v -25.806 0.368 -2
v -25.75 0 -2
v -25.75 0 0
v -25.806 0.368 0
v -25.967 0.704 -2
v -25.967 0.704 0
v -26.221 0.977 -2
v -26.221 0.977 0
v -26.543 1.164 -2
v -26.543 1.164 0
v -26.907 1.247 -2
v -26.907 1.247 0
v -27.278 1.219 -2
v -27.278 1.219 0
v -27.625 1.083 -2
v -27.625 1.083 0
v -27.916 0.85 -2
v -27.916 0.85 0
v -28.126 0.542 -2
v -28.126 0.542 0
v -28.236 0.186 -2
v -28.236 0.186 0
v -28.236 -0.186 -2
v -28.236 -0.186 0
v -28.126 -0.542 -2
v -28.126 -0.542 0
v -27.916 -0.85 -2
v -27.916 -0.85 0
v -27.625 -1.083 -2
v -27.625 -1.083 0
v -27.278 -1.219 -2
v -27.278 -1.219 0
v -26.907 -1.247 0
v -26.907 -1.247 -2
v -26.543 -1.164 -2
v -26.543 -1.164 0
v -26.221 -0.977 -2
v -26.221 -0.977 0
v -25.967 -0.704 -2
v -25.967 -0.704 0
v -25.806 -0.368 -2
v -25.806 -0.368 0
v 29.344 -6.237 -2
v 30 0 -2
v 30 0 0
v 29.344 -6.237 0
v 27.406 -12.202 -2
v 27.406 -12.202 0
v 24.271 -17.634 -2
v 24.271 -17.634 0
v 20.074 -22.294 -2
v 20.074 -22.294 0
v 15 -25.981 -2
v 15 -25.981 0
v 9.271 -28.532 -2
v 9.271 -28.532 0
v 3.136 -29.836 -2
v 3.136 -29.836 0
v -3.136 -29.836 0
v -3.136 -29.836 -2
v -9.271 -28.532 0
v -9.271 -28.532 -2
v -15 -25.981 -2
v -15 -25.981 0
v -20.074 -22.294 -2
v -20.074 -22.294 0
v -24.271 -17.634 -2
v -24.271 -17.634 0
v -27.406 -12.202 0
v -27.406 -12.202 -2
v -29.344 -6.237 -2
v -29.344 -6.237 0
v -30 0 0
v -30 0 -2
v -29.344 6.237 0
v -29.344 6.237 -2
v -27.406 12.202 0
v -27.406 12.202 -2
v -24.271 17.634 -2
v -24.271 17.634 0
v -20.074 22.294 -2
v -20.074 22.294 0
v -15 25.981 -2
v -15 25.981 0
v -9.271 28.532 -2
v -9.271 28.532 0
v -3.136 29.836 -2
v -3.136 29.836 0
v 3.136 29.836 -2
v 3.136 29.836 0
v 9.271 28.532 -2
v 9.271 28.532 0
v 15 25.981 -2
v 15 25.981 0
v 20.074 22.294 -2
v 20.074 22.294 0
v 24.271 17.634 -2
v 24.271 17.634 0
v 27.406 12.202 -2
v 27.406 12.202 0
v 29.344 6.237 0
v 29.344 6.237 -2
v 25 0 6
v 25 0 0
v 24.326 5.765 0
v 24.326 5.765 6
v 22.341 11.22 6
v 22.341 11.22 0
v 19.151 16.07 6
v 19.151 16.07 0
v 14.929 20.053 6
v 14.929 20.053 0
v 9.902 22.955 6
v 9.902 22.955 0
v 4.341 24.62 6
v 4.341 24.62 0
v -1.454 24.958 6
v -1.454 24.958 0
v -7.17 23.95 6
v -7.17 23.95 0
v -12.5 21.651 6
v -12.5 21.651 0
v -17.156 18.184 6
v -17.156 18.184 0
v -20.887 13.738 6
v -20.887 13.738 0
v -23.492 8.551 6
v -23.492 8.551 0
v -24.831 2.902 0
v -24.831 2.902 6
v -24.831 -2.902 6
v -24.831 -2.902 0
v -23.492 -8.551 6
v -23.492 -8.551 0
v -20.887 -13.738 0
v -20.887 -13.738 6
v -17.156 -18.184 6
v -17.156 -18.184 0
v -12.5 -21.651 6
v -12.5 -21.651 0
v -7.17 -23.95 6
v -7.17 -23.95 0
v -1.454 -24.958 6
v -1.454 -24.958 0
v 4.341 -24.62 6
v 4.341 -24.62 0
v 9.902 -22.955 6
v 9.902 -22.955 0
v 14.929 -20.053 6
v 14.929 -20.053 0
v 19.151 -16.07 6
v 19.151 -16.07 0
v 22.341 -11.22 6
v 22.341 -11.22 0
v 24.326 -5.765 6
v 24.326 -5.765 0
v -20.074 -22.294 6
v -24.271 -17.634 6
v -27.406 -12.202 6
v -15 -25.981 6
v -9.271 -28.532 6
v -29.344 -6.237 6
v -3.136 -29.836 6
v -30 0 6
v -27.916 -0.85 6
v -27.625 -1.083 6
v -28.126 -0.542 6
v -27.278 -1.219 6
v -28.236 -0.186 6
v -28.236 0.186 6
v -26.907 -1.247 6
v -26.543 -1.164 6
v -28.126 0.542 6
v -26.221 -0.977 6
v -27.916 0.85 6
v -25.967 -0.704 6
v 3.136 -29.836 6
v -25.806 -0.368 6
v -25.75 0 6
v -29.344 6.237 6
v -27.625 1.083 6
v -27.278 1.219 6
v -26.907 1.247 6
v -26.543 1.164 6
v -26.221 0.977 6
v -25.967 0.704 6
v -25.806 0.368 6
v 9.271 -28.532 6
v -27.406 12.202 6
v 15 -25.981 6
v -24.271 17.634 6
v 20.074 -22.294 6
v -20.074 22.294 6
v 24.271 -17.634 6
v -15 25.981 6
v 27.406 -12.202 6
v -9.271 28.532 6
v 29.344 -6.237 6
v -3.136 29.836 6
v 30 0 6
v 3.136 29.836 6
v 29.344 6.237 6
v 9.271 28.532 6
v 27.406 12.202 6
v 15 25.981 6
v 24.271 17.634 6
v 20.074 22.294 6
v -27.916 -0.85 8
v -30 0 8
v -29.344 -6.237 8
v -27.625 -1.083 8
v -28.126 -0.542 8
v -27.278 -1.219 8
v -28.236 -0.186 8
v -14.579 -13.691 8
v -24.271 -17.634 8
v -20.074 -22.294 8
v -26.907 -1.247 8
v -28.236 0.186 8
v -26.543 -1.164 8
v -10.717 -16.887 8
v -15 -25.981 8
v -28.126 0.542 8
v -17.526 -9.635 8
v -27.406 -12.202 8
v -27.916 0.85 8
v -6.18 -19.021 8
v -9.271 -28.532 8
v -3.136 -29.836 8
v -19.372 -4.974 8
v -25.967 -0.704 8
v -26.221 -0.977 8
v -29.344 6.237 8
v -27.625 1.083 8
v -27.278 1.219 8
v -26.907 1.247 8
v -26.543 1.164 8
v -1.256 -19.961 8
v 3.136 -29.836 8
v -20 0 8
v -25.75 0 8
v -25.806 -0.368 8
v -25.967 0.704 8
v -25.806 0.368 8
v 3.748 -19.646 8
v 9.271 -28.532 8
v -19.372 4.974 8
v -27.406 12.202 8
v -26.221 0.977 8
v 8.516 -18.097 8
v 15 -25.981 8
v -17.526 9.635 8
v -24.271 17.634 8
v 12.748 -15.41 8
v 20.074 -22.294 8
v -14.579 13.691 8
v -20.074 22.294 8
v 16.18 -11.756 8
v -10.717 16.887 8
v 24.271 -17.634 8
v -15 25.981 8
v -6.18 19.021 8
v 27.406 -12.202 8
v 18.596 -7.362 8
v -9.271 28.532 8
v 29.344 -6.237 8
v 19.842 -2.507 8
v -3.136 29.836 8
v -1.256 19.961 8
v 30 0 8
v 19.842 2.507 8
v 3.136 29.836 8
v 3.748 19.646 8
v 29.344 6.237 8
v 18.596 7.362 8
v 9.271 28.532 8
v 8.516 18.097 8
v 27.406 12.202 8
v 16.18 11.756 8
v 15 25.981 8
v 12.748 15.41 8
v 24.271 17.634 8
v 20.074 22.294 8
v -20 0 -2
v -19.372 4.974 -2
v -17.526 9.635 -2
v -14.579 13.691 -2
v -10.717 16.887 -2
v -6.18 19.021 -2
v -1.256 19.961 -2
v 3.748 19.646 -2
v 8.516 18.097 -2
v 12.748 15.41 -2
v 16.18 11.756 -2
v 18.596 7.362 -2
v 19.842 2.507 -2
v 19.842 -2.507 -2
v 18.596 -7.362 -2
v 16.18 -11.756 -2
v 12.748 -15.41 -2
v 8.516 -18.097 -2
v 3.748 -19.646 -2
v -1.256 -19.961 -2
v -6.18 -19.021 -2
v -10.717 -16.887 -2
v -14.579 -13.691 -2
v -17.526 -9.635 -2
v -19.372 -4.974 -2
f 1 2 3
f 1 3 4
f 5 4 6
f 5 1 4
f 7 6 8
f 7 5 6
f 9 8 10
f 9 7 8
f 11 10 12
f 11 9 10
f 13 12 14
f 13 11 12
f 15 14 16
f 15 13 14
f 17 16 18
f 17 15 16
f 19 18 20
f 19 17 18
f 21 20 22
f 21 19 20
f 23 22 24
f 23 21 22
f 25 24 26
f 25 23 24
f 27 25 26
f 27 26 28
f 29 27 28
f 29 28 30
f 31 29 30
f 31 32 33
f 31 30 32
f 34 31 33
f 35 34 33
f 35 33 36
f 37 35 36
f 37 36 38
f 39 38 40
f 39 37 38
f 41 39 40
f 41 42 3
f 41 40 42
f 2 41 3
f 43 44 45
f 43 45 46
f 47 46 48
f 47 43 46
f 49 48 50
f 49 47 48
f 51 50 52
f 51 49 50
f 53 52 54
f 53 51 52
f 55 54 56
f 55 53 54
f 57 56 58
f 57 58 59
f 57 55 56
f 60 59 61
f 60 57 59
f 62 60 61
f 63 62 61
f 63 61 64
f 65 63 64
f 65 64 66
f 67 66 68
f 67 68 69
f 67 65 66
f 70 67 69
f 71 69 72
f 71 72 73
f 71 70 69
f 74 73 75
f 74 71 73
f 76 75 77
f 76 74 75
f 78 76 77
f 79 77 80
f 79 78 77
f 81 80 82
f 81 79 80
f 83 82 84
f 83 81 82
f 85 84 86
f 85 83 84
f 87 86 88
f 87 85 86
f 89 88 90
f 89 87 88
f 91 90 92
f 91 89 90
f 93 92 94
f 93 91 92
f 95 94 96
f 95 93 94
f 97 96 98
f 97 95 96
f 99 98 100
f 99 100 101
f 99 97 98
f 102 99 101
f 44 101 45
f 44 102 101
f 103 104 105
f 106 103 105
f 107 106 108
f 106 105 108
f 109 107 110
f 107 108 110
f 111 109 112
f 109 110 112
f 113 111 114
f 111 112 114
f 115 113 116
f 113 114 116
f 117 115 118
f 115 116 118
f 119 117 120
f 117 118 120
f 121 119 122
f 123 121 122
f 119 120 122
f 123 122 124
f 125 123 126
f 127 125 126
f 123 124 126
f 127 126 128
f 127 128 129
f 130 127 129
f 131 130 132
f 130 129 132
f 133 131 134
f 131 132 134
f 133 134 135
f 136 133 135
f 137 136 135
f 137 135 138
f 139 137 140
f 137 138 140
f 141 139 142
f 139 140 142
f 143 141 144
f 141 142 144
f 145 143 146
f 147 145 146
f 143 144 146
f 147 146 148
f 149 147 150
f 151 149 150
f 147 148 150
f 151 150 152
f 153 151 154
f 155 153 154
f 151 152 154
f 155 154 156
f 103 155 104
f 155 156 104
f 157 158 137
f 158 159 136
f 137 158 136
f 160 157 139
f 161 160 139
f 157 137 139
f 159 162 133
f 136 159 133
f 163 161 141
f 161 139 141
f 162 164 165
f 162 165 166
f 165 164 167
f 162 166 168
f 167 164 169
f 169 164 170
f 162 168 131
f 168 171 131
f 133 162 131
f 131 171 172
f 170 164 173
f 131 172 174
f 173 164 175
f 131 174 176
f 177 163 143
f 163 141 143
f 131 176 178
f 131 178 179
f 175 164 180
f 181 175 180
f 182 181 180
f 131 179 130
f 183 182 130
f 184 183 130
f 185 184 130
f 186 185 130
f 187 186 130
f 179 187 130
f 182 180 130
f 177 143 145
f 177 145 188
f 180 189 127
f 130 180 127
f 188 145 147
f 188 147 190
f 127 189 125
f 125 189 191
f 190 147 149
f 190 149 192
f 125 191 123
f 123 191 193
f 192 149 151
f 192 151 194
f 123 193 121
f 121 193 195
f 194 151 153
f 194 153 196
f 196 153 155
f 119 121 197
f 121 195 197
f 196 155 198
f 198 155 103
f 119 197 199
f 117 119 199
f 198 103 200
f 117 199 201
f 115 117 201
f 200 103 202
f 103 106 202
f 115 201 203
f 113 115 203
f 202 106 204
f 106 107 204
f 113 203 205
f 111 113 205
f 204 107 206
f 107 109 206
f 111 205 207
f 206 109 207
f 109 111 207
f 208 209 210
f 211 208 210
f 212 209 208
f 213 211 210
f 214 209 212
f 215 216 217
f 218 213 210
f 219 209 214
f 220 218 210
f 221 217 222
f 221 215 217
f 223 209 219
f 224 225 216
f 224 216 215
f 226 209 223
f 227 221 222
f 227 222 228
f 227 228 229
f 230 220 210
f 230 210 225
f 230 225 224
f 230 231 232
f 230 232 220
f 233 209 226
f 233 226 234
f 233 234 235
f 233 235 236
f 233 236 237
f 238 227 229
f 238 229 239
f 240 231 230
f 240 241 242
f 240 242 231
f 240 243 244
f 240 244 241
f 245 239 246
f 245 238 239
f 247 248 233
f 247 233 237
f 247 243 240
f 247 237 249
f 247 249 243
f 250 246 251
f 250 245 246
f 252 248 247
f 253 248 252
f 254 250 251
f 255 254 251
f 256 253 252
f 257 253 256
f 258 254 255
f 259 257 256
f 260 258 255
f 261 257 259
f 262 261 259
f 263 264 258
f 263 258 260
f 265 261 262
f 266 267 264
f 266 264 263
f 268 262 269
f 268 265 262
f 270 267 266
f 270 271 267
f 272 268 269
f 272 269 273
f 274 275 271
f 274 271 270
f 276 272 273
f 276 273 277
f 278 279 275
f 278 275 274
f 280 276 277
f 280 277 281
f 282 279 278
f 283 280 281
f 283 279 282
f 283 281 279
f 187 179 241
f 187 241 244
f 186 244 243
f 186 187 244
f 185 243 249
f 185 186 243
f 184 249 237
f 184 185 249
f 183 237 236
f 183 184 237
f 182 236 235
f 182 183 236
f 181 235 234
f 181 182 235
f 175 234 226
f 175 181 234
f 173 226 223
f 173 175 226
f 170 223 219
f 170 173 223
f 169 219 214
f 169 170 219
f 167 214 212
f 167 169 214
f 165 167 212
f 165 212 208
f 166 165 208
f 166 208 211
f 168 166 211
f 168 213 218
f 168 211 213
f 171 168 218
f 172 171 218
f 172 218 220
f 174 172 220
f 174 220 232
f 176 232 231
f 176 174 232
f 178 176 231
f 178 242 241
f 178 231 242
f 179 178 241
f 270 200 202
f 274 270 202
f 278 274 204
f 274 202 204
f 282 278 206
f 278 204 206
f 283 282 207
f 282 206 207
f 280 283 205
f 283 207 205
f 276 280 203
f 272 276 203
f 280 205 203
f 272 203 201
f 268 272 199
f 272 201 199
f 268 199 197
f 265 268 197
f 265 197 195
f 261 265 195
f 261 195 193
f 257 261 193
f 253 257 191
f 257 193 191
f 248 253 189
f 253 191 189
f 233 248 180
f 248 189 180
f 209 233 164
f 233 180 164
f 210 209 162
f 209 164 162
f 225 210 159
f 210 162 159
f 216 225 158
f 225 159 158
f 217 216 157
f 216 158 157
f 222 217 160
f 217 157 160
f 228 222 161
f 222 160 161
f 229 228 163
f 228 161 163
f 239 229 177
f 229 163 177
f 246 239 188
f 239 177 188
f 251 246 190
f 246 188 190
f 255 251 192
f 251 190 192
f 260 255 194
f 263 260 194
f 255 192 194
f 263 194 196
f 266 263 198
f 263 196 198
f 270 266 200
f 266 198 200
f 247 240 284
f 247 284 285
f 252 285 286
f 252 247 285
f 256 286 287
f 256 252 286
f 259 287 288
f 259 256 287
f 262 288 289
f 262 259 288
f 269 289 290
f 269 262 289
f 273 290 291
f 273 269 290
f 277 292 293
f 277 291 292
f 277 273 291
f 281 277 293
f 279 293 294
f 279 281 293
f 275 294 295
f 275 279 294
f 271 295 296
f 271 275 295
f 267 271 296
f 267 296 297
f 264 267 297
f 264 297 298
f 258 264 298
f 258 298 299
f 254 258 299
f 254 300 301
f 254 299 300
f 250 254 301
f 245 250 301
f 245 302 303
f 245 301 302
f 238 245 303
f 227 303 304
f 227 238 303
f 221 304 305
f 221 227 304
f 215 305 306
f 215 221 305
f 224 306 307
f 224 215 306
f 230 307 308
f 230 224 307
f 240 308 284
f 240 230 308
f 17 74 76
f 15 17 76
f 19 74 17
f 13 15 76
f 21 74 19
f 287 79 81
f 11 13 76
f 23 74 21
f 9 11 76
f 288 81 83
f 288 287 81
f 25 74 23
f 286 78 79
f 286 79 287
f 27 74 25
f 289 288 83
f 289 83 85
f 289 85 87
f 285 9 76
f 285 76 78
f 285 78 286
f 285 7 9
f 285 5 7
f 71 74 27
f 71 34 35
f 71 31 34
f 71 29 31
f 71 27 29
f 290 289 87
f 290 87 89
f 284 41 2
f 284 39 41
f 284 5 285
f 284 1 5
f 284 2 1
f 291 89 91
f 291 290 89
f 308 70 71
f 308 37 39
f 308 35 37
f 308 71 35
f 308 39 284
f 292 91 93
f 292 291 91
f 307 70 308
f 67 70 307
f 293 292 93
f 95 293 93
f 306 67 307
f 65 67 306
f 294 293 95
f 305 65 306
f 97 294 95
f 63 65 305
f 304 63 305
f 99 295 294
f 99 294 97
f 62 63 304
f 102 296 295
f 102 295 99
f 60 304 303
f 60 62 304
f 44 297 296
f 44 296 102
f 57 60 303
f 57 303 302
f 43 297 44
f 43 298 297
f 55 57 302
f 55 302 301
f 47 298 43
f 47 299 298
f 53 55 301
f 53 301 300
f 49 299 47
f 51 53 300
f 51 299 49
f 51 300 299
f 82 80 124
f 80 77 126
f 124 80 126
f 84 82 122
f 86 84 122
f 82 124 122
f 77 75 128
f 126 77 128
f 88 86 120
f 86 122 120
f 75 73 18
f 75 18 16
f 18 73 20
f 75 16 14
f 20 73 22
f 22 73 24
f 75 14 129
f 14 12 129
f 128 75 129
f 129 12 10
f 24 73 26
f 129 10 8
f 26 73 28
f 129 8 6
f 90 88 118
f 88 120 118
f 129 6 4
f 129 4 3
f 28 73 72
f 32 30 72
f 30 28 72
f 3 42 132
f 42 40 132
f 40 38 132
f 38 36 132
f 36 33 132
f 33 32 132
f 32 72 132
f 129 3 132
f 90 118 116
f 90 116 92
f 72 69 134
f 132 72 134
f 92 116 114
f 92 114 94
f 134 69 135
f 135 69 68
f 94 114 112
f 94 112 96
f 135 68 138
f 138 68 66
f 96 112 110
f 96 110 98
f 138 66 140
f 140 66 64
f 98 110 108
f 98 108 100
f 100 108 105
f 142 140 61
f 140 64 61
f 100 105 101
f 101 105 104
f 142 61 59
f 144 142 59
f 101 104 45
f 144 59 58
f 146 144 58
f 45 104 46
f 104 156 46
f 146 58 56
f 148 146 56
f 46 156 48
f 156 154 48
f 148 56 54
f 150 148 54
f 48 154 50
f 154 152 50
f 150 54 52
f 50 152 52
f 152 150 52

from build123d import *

# Parameters (mm, degrees)
SKETCH_2_R               = 25
EXTRUDE_1_DEPTH          = 6
SKETCH_3_R               = 30
EXTRUDE_2_DEPTH          = 2
EXTRUDE_START            = 2
SKETCH_4_R               = 30
EXTRUDE_4_DEPTH          = 2
CUT_EXTRUDE_1_DEPTH      = 44.588989435
CUT_EXTRUDE_1_DEPTH_BACK = 44.588989435
SKETCH_5_R               = 20
CUT_EXTRUDE_3_DEPTH      = 44.588989435
CUT_EXTRUDE_3_DEPTH_BACK = 44.588989435
SKETCH_7_R               = 1.25


with BuildPart() as part:
    # 스케치2 → 보스-돌출1 (new body)
    with BuildSketch(Plane.XY):
        Circle(SKETCH_2_R)
    extrude(amount=EXTRUDE_1_DEPTH)

    # 스케치3 → 보스-돌출2 (add)
    with BuildSketch(Plane.XY.offset(6)):
        Circle(SKETCH_3_R)
    extrude(amount=EXTRUDE_2_DEPTH)

    # 스케치4 → 보스-돌출4 (add)
    with BuildSketch(Plane(origin=(0, 0, 0), x_dir=(-1, 0, 0), z_dir=(0, 0, -1)).offset(EXTRUDE_START)):
        with Locations(Location((0, 0, 0), (0, 0, 180))):
            Circle(SKETCH_4_R)
    extrude(amount=-EXTRUDE_4_DEPTH)

    # 스케치5 → 컷-돌출1 (cut, two sides: drawn at the far end of the back side and taken through both)
    with BuildSketch(Plane(origin=(0, 0, -2), x_dir=(-1, 0, 0), z_dir=(0, 0, -1)).offset(-CUT_EXTRUDE_1_DEPTH_BACK)):
        Circle(SKETCH_5_R)
    extrude(amount=CUT_EXTRUDE_1_DEPTH + CUT_EXTRUDE_1_DEPTH_BACK, mode=Mode.SUBTRACT)

    # 스케치7 → 컷-돌출3 (cut, two sides: drawn at the far end of the back side and taken through both)
    with BuildSketch(Plane.XY.offset(8).offset(-CUT_EXTRUDE_3_DEPTH_BACK)):
        with Locations((-27, 0)):
            Circle(SKETCH_7_R)
    extrude(amount=CUT_EXTRUDE_3_DEPTH + CUT_EXTRUDE_3_DEPTH_BACK, mode=Mode.SUBTRACT)


solid = part.part
